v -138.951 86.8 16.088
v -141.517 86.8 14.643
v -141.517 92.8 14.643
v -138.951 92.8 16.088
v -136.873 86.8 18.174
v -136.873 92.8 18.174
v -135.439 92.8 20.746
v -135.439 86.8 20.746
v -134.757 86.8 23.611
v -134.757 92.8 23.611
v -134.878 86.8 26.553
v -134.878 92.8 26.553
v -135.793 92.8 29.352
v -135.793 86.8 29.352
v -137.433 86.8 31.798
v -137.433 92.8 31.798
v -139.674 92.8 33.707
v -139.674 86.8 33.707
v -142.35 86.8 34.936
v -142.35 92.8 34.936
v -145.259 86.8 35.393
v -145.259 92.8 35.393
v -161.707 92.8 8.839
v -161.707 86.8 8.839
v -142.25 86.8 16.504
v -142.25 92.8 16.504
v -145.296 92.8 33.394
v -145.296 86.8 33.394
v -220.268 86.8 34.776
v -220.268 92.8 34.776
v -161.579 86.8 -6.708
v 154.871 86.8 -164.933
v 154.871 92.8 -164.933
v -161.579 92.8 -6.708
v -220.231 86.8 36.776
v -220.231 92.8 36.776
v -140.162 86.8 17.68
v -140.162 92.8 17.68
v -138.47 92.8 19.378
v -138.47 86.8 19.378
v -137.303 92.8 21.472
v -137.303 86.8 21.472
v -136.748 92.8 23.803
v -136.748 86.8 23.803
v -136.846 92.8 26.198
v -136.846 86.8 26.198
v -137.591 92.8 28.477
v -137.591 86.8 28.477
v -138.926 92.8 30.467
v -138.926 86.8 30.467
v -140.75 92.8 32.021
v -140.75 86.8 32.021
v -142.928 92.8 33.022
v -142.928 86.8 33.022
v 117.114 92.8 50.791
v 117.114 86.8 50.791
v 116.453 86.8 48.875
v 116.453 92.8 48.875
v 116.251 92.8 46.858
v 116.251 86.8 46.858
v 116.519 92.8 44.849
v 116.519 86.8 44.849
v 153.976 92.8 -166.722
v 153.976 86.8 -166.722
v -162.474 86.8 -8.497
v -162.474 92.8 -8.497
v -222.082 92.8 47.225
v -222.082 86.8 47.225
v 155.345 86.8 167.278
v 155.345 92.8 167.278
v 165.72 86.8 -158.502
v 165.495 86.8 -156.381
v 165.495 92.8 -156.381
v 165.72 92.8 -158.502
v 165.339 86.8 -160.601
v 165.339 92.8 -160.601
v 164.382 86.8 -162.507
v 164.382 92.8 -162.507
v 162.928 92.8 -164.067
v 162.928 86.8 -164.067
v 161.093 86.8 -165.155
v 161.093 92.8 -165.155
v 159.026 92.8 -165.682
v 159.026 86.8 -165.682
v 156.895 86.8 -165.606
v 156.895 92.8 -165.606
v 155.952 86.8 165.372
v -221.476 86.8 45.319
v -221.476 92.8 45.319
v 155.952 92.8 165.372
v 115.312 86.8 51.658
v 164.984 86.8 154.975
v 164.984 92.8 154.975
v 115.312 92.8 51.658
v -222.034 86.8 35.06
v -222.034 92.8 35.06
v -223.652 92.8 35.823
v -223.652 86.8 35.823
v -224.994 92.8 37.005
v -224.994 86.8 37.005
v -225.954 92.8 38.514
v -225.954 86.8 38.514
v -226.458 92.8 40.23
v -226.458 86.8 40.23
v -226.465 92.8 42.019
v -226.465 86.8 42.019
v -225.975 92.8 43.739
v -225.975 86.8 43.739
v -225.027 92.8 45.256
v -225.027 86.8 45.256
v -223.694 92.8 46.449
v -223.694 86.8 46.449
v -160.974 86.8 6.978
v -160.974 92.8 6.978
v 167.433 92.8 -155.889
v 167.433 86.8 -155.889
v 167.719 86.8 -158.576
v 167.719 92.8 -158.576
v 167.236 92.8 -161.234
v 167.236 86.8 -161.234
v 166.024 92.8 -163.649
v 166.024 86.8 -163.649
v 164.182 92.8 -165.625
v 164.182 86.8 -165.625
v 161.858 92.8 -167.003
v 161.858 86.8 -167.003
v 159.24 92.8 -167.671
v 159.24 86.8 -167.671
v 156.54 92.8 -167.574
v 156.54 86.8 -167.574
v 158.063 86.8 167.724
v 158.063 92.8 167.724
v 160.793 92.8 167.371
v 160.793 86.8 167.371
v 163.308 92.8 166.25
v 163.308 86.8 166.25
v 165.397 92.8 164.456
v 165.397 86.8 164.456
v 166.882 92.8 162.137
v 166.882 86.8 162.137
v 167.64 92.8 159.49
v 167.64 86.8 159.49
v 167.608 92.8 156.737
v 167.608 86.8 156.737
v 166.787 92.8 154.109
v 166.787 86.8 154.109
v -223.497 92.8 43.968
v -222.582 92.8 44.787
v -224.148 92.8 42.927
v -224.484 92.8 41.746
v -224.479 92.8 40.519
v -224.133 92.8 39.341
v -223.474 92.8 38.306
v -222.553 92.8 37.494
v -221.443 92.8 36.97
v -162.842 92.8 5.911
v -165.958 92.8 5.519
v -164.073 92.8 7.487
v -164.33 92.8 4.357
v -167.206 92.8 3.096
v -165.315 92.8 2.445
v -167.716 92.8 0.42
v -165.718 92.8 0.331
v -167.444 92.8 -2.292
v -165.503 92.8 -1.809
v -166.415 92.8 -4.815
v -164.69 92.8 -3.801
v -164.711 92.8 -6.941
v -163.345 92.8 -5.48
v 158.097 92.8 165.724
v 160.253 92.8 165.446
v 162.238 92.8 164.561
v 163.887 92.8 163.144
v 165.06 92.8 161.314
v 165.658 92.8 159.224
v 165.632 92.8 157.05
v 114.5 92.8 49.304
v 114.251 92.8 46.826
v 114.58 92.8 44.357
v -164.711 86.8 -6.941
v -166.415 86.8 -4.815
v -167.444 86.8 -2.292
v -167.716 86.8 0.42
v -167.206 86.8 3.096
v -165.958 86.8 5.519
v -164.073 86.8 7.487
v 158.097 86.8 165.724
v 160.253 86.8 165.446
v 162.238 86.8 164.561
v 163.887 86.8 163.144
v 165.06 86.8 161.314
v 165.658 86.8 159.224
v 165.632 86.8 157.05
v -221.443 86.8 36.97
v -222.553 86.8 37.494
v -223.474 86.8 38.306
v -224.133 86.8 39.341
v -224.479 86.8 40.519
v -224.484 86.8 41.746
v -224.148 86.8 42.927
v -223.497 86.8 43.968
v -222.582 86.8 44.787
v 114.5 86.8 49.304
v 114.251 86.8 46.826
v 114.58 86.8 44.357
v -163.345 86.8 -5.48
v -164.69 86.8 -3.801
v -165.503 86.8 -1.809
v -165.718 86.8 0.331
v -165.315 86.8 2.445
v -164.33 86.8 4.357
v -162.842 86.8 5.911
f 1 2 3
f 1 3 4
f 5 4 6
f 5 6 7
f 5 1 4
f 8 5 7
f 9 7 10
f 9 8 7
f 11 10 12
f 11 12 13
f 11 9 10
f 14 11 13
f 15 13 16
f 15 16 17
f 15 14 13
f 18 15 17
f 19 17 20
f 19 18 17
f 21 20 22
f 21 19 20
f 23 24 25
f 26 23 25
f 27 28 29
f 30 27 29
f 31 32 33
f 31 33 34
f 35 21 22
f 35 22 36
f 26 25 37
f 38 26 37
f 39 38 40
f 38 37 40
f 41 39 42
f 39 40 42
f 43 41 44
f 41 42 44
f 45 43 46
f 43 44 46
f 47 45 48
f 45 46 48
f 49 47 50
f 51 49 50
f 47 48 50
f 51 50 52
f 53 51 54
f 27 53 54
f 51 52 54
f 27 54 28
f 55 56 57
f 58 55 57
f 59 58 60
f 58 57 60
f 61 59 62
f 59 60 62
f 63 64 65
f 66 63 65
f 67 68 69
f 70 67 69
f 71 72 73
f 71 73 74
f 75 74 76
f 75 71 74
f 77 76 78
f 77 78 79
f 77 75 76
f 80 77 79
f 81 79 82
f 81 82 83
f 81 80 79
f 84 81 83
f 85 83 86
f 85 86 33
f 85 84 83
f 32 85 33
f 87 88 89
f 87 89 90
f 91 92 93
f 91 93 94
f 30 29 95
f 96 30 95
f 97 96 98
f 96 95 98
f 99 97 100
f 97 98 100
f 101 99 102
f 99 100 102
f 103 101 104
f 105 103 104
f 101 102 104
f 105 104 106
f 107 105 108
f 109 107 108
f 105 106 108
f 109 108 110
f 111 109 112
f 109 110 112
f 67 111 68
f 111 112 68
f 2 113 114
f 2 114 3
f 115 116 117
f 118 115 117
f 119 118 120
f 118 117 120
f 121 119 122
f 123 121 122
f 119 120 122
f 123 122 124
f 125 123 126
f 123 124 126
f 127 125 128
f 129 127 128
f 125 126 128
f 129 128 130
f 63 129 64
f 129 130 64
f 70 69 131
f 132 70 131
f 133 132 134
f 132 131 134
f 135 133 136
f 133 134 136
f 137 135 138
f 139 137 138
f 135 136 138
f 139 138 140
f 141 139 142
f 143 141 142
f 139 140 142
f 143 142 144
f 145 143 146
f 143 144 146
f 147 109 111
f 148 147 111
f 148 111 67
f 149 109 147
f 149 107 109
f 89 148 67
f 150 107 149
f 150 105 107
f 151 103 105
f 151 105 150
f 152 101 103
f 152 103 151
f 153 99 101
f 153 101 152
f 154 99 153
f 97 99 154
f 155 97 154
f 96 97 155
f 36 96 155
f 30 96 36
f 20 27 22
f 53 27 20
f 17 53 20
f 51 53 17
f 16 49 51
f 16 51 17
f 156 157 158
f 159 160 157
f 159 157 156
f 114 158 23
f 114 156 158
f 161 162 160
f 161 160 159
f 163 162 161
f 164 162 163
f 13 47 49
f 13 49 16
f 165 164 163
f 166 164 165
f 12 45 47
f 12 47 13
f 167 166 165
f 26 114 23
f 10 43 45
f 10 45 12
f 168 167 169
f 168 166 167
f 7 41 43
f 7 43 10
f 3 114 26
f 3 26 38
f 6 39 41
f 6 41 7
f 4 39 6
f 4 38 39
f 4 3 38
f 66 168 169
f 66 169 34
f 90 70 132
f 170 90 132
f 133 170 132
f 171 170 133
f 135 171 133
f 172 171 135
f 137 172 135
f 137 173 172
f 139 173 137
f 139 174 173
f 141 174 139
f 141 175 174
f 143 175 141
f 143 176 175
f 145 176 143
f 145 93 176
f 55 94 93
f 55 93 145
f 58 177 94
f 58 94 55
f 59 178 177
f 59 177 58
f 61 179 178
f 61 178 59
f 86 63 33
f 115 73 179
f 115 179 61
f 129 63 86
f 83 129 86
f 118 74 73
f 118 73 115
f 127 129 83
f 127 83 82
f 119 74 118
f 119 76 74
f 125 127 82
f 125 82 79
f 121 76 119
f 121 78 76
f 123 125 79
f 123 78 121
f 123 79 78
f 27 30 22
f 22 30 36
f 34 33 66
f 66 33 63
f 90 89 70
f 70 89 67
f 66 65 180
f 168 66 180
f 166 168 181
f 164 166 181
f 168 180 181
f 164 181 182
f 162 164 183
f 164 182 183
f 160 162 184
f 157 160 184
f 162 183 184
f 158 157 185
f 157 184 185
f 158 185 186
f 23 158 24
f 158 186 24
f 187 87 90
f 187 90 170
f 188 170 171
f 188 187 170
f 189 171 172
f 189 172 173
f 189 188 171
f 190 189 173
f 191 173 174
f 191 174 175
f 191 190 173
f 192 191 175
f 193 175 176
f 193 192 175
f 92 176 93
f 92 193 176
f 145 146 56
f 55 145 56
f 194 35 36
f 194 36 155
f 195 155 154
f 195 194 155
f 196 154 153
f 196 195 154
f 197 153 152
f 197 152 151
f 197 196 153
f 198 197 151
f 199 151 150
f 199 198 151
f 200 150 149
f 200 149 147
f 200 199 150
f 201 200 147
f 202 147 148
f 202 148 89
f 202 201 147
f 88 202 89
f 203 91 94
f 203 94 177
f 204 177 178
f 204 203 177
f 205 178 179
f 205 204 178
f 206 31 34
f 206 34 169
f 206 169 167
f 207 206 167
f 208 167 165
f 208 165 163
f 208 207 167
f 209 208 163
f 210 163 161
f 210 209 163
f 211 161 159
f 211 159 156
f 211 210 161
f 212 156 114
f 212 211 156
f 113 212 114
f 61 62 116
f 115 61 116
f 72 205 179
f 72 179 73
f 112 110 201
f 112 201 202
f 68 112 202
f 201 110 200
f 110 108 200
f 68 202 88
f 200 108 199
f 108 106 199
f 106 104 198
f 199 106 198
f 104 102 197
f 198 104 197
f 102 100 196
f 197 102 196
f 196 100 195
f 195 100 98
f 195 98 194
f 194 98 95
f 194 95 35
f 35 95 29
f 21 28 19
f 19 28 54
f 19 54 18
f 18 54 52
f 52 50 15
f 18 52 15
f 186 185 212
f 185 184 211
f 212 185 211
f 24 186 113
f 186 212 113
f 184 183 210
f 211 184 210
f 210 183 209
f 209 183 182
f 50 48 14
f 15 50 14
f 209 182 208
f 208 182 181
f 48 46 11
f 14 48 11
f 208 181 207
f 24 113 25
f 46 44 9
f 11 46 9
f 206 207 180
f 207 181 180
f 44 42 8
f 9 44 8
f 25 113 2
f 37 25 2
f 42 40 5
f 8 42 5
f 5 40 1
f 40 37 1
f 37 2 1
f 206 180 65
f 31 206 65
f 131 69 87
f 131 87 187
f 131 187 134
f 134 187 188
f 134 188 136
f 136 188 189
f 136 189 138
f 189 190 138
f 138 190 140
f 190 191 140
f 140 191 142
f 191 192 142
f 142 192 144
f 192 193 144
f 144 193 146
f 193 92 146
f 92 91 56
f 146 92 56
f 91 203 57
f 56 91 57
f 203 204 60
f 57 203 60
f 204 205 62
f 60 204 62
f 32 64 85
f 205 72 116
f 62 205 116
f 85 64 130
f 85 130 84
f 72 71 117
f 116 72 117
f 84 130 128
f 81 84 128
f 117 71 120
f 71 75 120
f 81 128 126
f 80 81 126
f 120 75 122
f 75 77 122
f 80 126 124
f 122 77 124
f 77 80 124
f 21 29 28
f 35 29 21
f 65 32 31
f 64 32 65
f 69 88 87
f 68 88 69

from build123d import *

# Parameters (mm, degrees)
EXTRUDE_THIN1_DEPTH = 6


with BuildPart() as part:
    # Sketch1 → Extrude-Thin1 (new body)
    with BuildSketch(Plane(origin=(0, 86.8, 0), x_dir=(1, 0, 0), z_dir=(0, 1, 0))):
        with BuildLine():
            Line((153.976470843, 166.722058314), (-162.473529157, 8.497058315))
            ThreePointArc((-162.473529157, 8.497058314), (-167.715732066, -0.419529316), (-161.707213549, -8.838788876))
            Line((-161.707213549, -8.838788876), (-142.250173329, -16.504269977))
            ThreePointArc((-142.250173329, -16.504269977), (-136.846395058, -26.198255989), (-145.296171508, -33.393772811))
            Line((-145.296171508, -33.393772811), (-220.267521321, -34.776083328))
            ThreePointArc((-220.267521321, -34.776083328), (-226.458318107, -40.230354602), (-222.082372691, -47.225077019))
            Line((-222.082372691, -47.225077019), (155.345385794, -167.278055949))
            ThreePointArc((155.345385794, -167.278055949), (165.396500417, -164.455536235), (166.786864342, -154.108632792))
            Line((166.786864342, -154.108632792), (117.114072317, -50.79139085))
            ThreePointArc((117.114072317, -50.79139085), (116.29360588, -47.872468586), (116.518563148, -44.848784313))
            Line((116.518563148, -44.848784313), (167.433417153, 155.889394397))
            ThreePointArc((167.433417153, 155.889394397), (164.182077649, 165.625217962), (153.976470843, 166.722058314))
        make_face()
        with BuildLine():
            Line((154.870898034, 164.933203932), (-161.579101966, 6.708203933))
            ThreePointArc((-161.579101966, 6.708203933), (-165.71768321, -0.331207355), (-160.97411596, -6.977991218))
            Line((-160.97411596, -6.977991218), (-141.517075739, -14.643472319))
            ThreePointArc((-141.517075739, -14.643472319), (-134.87814815, -26.553226562), (-145.259302074, -35.393432943))
            Line((-145.259302074, -35.393432943), (-220.230651887, -36.775743461))
            ThreePointArc((-220.230651887, -36.775743461), (-224.479237917, -40.518870805), (-221.476138121, -45.319170503))
            Line((-221.476138121, -45.319170503), (155.951620364, -165.372149434))
            ThreePointArc((155.951620364, -165.372149434), (163.886710855, -163.143844396), (164.984366586, -154.975236414))
            Line((164.984366586, -154.975236414), (115.311574561, -51.657994473))
            ThreePointArc((115.311574561, -51.657994473), (114.303572939, -48.071889977), (114.579949011, -44.35707787))
            Line((114.579949011, -44.35707787), (165.494803016, 156.38110084))
            ThreePointArc((165.494803016, 156.38110084), (162.927956039, 164.067277338), (154.870898034, 164.933203932))
        make_face(mode=Mode.SUBTRACT)
    extrude(amount=EXTRUDE_THIN1_DEPTH)


solid = part.part
